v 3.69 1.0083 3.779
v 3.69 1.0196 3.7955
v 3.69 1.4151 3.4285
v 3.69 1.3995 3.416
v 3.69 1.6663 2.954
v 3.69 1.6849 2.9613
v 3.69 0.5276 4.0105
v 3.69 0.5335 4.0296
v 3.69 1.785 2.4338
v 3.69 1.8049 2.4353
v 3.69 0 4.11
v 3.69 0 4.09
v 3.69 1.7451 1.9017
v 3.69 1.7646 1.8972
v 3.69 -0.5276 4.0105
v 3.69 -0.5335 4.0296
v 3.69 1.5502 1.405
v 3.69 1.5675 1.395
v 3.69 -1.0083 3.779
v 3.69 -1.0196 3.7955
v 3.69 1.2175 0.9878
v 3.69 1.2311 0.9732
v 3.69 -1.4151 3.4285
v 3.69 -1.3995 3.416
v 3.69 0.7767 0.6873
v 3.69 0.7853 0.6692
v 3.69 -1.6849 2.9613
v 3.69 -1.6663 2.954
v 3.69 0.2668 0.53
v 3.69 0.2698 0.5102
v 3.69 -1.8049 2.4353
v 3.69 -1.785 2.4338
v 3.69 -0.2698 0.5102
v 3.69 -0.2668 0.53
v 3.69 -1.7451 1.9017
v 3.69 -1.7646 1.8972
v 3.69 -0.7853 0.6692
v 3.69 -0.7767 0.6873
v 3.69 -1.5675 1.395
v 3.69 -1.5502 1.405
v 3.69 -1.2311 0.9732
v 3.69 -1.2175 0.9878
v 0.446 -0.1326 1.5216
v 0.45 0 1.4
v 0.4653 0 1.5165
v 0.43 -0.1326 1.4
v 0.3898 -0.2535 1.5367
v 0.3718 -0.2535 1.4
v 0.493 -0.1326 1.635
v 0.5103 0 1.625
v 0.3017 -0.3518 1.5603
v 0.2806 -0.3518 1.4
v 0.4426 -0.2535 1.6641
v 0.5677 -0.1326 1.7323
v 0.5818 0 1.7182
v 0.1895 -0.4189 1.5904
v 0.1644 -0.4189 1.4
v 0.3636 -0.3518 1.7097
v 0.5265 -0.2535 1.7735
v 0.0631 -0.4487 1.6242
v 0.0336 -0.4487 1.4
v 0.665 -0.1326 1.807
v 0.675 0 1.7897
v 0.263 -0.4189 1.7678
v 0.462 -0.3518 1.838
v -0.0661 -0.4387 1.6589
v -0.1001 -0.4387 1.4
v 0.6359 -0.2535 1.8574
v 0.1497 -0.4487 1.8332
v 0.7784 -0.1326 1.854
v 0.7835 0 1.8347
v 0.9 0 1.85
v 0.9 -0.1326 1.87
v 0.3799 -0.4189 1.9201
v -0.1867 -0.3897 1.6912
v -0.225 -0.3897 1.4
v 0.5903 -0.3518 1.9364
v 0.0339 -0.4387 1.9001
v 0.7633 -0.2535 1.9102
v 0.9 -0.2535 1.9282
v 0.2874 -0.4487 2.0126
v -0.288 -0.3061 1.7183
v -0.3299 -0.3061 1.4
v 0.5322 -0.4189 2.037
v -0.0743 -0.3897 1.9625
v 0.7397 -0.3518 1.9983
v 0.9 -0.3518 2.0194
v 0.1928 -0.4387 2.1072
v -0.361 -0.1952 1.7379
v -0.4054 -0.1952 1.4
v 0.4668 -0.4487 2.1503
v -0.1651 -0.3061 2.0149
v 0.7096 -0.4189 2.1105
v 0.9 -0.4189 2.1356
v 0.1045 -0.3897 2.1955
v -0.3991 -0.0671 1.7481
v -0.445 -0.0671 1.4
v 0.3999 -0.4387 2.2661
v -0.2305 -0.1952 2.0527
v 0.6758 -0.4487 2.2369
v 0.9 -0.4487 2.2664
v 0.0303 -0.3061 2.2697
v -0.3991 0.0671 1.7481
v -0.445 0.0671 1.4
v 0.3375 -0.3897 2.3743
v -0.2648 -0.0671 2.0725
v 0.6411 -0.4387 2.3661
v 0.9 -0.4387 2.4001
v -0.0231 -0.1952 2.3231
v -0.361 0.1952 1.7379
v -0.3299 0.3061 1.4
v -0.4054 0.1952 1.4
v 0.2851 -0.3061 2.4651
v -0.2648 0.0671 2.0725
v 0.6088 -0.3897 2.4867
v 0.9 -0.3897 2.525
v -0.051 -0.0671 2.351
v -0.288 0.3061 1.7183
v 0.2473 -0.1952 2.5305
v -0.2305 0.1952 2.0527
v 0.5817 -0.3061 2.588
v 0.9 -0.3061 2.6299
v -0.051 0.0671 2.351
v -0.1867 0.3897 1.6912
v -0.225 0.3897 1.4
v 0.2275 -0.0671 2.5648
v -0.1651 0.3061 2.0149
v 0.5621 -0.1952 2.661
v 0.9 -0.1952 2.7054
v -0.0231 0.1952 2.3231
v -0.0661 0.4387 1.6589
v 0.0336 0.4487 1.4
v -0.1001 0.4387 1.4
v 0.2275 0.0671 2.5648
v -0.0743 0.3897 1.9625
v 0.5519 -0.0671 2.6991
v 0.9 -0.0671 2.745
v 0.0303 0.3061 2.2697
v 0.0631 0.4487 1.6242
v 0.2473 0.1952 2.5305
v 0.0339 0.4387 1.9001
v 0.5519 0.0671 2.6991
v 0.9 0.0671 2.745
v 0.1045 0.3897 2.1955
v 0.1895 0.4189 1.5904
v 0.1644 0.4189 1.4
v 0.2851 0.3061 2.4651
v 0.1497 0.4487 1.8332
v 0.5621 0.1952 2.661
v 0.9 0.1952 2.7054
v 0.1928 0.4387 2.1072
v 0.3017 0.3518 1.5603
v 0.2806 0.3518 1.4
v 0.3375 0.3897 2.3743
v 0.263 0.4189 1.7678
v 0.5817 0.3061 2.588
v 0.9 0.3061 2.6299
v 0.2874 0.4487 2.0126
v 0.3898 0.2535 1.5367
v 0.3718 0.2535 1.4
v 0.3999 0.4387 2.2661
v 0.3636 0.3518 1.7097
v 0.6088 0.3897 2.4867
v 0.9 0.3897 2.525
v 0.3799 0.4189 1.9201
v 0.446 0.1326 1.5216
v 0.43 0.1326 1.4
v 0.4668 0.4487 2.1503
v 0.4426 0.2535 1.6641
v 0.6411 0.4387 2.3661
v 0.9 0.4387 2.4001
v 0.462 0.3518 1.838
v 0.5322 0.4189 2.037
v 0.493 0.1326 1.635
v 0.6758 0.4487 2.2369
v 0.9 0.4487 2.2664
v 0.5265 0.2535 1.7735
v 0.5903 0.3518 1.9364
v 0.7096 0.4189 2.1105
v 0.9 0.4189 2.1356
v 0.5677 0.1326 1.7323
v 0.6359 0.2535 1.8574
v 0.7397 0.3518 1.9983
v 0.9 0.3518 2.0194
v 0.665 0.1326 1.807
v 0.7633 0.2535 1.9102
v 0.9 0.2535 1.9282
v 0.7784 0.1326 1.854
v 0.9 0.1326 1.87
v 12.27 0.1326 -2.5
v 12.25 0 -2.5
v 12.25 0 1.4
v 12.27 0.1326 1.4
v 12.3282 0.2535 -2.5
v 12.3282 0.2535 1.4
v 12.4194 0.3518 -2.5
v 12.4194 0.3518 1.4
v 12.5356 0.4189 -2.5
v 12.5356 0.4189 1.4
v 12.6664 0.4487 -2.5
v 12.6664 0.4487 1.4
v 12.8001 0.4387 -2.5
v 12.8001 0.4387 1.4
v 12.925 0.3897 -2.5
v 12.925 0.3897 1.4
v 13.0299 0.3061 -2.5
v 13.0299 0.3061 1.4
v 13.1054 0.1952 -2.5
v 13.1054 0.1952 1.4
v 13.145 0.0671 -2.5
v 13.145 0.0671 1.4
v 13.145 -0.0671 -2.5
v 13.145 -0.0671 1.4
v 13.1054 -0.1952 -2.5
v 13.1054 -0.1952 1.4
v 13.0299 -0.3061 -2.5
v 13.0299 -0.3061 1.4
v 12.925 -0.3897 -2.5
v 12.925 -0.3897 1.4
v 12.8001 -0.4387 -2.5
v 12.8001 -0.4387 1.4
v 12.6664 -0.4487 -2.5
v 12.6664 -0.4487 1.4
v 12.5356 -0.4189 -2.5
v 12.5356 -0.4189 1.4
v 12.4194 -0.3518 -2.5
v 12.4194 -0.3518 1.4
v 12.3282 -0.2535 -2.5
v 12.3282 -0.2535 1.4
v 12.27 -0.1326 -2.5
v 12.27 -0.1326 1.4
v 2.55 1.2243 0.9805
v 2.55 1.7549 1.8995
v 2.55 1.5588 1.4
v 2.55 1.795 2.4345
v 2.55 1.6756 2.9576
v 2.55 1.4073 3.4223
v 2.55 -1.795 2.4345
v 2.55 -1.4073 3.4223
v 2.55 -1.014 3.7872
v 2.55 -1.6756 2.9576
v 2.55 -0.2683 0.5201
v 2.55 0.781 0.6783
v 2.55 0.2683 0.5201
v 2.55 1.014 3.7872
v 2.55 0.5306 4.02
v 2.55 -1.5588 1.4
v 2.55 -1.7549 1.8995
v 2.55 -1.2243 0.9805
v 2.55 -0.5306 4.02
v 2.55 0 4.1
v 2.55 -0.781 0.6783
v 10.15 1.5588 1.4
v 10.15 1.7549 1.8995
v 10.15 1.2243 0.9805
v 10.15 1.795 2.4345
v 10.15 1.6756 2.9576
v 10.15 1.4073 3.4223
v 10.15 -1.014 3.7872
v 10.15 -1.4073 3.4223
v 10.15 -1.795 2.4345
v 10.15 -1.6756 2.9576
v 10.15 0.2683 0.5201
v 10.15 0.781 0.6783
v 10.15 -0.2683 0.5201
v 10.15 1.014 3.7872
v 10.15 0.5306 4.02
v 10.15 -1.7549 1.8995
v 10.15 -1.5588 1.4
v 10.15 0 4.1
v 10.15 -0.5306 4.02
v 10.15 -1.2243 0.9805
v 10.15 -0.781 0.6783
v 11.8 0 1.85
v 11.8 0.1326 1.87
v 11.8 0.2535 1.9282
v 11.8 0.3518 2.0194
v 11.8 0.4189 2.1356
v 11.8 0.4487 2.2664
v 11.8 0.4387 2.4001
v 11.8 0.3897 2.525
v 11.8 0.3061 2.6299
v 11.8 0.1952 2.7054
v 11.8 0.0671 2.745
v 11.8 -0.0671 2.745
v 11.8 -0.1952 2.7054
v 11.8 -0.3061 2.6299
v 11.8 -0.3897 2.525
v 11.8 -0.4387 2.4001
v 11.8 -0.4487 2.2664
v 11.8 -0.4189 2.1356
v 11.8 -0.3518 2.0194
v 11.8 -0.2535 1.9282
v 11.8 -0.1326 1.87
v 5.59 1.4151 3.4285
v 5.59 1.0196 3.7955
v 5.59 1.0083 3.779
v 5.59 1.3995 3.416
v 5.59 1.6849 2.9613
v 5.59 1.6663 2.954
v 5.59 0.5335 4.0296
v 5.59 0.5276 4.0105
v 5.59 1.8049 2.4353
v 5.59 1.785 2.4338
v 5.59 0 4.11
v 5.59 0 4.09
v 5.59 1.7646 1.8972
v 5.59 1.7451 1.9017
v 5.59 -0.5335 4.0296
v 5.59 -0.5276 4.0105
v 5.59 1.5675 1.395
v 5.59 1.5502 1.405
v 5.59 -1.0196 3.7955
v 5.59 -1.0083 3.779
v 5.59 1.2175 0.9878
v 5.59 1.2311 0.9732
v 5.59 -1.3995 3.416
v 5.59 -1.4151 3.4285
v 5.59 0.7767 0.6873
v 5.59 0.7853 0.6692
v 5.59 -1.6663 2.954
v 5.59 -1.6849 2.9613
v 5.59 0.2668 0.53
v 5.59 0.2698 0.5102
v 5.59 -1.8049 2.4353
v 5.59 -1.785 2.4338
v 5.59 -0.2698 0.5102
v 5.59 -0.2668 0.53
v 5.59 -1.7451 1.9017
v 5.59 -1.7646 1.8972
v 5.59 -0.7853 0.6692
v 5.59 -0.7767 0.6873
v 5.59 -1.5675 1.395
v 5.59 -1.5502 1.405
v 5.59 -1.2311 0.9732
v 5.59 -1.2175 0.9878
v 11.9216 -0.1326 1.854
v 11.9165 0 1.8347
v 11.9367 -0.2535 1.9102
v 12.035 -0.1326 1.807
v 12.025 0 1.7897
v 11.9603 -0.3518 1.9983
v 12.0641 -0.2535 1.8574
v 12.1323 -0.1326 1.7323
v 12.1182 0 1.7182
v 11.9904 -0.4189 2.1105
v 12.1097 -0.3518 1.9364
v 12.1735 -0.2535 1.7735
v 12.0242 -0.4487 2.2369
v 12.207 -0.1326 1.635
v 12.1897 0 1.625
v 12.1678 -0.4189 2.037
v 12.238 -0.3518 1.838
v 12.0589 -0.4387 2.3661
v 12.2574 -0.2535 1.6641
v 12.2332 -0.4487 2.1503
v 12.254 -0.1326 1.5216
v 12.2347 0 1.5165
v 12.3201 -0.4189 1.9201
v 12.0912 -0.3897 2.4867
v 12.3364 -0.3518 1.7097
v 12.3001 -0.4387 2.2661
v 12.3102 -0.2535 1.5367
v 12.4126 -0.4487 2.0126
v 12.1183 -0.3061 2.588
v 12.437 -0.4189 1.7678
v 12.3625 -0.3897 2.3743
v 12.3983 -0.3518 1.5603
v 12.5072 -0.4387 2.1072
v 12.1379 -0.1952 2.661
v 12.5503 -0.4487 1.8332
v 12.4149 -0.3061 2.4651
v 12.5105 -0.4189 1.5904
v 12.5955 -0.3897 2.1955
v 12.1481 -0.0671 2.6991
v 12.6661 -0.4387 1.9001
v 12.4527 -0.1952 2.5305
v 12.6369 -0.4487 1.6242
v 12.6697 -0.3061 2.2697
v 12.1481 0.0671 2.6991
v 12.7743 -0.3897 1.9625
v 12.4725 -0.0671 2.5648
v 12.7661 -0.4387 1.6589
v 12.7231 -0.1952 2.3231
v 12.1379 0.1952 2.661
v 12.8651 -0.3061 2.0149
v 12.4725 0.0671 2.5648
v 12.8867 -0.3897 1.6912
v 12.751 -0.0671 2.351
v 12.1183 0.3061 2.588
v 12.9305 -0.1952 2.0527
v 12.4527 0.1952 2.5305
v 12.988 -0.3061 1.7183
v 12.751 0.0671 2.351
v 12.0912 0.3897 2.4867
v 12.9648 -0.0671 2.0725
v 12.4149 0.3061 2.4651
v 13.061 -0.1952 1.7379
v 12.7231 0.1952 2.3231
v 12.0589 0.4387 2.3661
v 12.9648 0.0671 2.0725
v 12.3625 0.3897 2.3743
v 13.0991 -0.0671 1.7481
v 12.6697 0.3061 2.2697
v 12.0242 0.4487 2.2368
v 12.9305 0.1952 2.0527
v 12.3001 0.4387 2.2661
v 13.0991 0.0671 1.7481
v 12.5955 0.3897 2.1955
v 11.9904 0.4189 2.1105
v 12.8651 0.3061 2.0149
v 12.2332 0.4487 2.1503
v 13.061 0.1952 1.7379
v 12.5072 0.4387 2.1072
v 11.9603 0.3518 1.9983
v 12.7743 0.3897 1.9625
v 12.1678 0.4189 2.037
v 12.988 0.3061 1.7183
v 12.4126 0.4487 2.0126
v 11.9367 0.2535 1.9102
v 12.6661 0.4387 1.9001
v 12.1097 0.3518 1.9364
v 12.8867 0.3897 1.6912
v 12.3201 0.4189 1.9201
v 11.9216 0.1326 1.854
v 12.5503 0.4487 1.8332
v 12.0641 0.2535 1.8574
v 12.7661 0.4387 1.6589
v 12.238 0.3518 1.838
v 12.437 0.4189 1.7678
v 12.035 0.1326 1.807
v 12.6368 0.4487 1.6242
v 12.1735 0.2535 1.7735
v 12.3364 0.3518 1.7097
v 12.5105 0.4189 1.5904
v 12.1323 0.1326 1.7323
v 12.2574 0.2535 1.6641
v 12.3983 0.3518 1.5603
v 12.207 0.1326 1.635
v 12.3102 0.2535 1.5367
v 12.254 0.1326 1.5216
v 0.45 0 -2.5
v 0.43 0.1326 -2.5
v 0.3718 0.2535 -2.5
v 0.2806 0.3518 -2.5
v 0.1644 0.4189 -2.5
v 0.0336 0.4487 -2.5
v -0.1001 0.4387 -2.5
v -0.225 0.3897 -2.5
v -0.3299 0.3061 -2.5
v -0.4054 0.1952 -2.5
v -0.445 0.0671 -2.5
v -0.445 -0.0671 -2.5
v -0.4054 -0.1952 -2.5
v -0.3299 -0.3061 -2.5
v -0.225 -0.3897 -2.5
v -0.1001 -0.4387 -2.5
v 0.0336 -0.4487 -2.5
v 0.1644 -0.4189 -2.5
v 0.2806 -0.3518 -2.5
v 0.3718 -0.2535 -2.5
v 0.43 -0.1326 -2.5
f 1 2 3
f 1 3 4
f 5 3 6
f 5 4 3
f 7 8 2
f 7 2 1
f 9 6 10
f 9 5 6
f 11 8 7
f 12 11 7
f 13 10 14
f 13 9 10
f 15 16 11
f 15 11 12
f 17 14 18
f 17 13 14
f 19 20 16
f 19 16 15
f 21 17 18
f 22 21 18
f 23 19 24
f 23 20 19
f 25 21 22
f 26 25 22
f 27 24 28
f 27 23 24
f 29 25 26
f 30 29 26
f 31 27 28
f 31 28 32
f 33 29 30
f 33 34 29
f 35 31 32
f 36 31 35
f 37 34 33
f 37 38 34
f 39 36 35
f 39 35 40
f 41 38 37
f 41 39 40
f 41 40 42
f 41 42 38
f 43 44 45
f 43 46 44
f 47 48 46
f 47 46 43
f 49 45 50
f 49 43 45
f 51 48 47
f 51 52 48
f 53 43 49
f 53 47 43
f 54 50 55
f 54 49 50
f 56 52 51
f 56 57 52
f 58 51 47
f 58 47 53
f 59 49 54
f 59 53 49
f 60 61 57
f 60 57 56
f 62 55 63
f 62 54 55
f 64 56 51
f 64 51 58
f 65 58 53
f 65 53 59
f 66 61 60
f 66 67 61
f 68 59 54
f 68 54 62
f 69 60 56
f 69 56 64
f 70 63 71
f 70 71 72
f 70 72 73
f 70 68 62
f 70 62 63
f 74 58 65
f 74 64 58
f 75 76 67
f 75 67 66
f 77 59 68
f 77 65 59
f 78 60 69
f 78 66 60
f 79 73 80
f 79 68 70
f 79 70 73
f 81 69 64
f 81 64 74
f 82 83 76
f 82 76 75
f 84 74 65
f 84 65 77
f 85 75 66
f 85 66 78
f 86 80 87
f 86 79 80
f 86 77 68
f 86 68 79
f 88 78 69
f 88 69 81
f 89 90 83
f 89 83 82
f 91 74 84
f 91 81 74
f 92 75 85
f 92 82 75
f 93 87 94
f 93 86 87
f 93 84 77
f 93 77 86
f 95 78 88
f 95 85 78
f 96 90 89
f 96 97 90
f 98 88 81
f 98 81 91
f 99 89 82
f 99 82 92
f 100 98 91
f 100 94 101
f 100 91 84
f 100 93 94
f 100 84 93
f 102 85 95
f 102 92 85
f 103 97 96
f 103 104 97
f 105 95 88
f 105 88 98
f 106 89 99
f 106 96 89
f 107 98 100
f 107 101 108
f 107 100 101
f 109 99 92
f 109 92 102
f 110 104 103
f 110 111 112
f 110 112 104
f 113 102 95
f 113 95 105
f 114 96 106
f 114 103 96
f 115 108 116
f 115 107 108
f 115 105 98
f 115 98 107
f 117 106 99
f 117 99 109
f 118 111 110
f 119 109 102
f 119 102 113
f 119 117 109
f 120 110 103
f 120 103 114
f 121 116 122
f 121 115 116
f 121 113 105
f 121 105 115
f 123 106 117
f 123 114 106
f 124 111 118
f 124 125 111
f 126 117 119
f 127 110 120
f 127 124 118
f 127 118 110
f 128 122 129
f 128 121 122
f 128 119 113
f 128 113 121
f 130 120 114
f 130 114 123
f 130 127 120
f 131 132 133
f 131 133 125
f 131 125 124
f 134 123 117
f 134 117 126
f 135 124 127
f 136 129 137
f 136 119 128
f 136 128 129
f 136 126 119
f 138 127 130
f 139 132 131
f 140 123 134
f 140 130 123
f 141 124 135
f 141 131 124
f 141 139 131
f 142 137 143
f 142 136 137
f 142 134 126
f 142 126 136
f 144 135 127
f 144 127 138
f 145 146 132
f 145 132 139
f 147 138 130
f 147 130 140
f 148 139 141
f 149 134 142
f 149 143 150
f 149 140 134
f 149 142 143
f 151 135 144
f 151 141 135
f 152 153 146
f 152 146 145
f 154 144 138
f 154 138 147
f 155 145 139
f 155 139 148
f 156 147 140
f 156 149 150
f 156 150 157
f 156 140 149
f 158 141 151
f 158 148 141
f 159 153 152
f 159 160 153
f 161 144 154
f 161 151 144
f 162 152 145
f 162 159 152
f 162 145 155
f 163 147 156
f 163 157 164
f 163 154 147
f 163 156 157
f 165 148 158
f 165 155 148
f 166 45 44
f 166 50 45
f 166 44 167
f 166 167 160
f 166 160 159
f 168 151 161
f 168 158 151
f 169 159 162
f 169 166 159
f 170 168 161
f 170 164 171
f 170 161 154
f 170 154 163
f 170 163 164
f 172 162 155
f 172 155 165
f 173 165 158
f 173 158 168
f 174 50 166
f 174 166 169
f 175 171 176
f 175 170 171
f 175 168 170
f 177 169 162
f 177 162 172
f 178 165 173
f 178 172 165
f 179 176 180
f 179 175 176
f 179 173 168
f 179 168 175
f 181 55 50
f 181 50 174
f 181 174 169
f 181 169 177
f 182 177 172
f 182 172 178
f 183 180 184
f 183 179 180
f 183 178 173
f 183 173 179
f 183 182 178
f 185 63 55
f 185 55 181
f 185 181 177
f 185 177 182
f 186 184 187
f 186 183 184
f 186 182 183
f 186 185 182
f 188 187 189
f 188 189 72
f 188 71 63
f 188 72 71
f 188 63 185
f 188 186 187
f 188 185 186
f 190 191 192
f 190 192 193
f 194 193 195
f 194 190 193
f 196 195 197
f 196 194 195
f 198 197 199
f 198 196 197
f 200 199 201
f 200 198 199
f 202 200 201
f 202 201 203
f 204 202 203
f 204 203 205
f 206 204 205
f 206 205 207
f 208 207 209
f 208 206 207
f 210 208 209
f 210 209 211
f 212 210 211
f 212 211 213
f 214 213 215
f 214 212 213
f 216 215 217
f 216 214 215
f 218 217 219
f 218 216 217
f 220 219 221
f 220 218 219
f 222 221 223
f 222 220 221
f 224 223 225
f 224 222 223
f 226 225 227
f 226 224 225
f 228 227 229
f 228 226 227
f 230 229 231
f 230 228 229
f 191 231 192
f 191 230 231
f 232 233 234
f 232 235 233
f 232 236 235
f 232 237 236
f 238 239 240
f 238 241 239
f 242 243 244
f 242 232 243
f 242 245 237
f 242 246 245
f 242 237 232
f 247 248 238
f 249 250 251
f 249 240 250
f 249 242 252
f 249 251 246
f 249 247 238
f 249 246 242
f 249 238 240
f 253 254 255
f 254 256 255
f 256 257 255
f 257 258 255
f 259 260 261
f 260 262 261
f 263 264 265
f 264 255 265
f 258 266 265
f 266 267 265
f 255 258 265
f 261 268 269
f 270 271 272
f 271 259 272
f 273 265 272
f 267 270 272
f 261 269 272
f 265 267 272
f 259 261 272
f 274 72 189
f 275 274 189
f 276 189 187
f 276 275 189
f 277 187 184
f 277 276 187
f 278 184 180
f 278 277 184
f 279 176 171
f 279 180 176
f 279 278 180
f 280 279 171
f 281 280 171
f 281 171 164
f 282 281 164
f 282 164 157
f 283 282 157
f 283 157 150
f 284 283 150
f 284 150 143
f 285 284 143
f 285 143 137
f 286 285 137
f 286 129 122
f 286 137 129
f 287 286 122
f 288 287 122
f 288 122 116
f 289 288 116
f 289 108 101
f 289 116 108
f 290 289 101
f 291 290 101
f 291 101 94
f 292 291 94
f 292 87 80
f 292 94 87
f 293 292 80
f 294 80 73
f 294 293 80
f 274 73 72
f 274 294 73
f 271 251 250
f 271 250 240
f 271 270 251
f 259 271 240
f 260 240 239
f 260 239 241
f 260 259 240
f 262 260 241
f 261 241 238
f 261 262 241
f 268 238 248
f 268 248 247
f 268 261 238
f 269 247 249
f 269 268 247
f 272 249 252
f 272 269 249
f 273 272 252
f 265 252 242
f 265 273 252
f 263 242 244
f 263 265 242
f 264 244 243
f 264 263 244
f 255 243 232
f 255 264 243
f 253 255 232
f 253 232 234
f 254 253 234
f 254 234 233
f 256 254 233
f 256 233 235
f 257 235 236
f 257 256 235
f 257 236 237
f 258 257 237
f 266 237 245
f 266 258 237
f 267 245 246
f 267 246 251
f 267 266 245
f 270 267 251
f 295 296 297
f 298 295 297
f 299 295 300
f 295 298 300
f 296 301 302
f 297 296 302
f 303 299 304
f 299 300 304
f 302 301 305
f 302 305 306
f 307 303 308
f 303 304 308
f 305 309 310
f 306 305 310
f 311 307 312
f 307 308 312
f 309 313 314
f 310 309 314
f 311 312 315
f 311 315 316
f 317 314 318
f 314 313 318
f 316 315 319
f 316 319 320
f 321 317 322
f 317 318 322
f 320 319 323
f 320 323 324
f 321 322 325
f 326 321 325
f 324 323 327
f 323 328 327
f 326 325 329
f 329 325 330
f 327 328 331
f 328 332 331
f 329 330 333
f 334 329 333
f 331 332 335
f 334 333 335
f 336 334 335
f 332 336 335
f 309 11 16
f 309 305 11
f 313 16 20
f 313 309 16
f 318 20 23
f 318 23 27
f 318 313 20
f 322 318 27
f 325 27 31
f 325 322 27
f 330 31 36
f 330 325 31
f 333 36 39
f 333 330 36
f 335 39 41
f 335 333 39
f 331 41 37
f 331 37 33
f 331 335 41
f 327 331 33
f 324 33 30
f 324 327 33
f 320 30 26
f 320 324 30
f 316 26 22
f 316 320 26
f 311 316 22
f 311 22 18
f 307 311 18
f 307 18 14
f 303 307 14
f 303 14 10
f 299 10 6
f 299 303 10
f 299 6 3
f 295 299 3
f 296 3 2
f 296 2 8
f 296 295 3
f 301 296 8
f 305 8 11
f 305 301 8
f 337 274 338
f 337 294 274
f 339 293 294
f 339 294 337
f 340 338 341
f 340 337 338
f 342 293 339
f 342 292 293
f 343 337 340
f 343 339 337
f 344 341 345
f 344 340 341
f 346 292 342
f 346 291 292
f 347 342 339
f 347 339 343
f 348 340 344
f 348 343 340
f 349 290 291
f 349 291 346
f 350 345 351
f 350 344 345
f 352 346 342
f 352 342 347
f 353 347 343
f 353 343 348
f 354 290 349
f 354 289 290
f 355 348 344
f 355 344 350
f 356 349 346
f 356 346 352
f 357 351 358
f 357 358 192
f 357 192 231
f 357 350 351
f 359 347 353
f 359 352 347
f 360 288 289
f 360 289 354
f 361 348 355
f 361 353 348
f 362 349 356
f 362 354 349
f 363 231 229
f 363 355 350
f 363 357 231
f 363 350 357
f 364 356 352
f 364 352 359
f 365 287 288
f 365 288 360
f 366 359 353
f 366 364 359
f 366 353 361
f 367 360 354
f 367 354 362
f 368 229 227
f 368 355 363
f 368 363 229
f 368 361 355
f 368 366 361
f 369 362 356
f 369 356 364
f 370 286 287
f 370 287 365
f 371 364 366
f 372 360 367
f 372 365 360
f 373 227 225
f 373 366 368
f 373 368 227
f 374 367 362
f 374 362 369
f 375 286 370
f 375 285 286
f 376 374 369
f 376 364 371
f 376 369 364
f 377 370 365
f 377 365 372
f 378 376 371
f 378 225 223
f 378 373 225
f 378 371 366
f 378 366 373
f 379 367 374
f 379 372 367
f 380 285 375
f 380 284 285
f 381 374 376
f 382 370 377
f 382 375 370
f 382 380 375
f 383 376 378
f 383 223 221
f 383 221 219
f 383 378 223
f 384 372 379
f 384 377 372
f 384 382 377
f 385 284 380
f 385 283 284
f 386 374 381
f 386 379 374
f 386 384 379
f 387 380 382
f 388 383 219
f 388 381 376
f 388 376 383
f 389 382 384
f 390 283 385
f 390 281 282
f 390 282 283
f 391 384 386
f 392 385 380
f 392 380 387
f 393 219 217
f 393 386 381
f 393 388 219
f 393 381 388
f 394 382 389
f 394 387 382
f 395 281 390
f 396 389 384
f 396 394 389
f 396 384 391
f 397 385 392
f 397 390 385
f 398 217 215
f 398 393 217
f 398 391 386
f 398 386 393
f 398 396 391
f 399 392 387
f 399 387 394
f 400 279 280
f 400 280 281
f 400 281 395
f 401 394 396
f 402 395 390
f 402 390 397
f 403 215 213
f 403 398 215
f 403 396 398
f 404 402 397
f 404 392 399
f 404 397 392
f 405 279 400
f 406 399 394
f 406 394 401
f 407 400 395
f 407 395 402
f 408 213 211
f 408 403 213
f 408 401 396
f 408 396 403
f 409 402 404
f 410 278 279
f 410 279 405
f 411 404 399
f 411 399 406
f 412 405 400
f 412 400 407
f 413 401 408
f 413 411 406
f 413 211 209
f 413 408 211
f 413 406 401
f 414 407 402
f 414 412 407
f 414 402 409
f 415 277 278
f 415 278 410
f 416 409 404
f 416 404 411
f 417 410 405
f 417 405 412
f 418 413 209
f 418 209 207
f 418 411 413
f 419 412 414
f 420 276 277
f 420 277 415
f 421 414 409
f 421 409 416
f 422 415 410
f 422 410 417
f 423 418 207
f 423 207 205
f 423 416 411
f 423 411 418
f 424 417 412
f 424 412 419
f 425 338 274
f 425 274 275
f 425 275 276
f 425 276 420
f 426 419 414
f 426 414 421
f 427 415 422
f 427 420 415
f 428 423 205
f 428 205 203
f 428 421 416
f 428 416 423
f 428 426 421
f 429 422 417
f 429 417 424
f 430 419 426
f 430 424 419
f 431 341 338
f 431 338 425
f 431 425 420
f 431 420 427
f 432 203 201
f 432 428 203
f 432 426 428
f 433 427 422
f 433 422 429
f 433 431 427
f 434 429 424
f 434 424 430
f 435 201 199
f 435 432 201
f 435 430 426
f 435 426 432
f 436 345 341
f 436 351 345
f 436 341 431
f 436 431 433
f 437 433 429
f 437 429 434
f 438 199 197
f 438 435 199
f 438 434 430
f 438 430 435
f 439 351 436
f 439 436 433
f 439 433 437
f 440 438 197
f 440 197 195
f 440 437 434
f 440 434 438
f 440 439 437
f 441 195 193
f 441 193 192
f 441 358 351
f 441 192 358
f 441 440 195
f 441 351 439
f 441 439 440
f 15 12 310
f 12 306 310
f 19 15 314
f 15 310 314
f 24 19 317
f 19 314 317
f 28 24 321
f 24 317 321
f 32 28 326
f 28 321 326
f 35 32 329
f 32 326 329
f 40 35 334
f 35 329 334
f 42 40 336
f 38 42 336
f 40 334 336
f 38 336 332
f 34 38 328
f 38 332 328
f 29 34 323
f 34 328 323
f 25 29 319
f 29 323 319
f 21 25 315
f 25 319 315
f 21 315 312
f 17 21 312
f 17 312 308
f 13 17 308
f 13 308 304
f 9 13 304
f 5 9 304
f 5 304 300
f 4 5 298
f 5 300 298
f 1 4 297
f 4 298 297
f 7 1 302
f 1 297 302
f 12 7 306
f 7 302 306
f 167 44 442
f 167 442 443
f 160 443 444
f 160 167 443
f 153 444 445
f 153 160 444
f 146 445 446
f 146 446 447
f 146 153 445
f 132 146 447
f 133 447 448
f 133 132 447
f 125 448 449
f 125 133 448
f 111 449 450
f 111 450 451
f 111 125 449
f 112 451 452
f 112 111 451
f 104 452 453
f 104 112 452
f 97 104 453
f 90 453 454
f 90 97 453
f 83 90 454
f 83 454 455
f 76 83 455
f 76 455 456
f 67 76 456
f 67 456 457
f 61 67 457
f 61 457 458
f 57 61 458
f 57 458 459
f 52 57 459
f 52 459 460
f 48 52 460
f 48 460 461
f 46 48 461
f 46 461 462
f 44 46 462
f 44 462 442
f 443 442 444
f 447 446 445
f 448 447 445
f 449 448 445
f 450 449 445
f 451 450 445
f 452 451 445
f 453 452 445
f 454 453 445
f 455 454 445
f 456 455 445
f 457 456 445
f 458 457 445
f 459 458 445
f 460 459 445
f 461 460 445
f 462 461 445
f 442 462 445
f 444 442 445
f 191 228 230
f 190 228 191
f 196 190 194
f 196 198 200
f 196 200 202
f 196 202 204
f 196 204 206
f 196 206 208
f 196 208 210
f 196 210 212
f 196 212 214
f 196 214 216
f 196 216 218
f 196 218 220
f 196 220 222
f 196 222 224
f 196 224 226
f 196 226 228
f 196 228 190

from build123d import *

# Parameters (mm, degrees)
SKETCH002_W = 7.6
SKETCH002_H = 1.8
SKETCH003_W = 1.9
SKETCH003_H = 0.02
SKETCH_R    = 0.45


with BuildPart() as revolution:
    # Sketch002 → Revolution (revolve)
    with BuildSketch(Plane.XZ):
        with Locations((6.35, 3.2)):
            Rectangle(SKETCH002_W, SKETCH002_H)
    revolve(axis=Axis((2.55, 0, 2.3), (1, 0, 0)))


with BuildPart() as revolution001:
    # Sketch003 → Revolution001 (revolve)
    with BuildSketch(Plane.XZ):
        with Locations((4.64, 4.1)):
            Rectangle(SKETCH003_W, SKETCH003_H)
    revolve(axis=Axis((0, 0, 2.3), (1, 0, 0)))


with BuildPart() as sweep_body:
    # Sweep: sweep along a path in Sketch001
    with BuildLine(Plane.XZ) as sweep_path:
        Line((0, -2.5), (0, 1.4))
        ThreePointArc((0, 1.4), (0.263604, 2.036396), (0.9, 2.3))
        Line((0.9, 2.3), (11.8, 2.3))
        ThreePointArc((11.8, 2.3), (12.436396, 2.036396), (12.7, 1.4))
        Line((12.7, 1.4), (12.7, -2.5))
    # Sketch → Sweep (sweep)
    with BuildSketch(Plane.XY.offset(-2)):
        Circle(SKETCH_R)
    sweep(path=sweep_path.line)


solid = Compound([revolution.part, revolution001.part, sweep_body.part])
